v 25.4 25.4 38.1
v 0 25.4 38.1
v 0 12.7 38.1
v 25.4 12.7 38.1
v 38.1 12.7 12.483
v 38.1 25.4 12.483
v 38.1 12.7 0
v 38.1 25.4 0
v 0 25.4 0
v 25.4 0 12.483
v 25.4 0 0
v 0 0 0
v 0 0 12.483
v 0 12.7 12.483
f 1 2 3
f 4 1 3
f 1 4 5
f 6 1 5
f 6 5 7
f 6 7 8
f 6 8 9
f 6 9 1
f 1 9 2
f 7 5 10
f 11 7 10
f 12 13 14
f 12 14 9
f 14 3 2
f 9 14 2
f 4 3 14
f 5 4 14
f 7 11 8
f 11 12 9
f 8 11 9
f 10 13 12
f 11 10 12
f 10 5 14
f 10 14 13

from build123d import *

# Parameters (mm, degrees)
F1_DEPTH = 38.1
F3_DEPTH = 25.4
F5_DEPTH = 25.4


with BuildPart() as f1:
    # F0 (on Right) → F1 (new body)
    with BuildSketch(Plane.YZ):
        Polygon((12.7, 12.482905), (0, 12.482905), (0, 0), (25.4, 0), (25.4, 38.1), (12.7, 38.1), align=None)
    extrude(amount=F1_DEPTH)

    # F2 (on face) → F3 (cut)
    with BuildSketch(Plane.XZ.offset(-12.7)):
        Polygon((38.1, 38.1), (25.4, 38.1), (38.1, 12.482905), align=None)
    extrude(amount=-F3_DEPTH, mode=Mode.SUBTRACT)

    # F4 (on face) → F5 (cut)
    with BuildSketch(Plane.XY.offset(12.482905)):
        Polygon((38.1, 0), (38.1, 12.7), (25.4, 0), align=None)
    extrude(amount=-F5_DEPTH, mode=Mode.SUBTRACT)


solid = f1.part
